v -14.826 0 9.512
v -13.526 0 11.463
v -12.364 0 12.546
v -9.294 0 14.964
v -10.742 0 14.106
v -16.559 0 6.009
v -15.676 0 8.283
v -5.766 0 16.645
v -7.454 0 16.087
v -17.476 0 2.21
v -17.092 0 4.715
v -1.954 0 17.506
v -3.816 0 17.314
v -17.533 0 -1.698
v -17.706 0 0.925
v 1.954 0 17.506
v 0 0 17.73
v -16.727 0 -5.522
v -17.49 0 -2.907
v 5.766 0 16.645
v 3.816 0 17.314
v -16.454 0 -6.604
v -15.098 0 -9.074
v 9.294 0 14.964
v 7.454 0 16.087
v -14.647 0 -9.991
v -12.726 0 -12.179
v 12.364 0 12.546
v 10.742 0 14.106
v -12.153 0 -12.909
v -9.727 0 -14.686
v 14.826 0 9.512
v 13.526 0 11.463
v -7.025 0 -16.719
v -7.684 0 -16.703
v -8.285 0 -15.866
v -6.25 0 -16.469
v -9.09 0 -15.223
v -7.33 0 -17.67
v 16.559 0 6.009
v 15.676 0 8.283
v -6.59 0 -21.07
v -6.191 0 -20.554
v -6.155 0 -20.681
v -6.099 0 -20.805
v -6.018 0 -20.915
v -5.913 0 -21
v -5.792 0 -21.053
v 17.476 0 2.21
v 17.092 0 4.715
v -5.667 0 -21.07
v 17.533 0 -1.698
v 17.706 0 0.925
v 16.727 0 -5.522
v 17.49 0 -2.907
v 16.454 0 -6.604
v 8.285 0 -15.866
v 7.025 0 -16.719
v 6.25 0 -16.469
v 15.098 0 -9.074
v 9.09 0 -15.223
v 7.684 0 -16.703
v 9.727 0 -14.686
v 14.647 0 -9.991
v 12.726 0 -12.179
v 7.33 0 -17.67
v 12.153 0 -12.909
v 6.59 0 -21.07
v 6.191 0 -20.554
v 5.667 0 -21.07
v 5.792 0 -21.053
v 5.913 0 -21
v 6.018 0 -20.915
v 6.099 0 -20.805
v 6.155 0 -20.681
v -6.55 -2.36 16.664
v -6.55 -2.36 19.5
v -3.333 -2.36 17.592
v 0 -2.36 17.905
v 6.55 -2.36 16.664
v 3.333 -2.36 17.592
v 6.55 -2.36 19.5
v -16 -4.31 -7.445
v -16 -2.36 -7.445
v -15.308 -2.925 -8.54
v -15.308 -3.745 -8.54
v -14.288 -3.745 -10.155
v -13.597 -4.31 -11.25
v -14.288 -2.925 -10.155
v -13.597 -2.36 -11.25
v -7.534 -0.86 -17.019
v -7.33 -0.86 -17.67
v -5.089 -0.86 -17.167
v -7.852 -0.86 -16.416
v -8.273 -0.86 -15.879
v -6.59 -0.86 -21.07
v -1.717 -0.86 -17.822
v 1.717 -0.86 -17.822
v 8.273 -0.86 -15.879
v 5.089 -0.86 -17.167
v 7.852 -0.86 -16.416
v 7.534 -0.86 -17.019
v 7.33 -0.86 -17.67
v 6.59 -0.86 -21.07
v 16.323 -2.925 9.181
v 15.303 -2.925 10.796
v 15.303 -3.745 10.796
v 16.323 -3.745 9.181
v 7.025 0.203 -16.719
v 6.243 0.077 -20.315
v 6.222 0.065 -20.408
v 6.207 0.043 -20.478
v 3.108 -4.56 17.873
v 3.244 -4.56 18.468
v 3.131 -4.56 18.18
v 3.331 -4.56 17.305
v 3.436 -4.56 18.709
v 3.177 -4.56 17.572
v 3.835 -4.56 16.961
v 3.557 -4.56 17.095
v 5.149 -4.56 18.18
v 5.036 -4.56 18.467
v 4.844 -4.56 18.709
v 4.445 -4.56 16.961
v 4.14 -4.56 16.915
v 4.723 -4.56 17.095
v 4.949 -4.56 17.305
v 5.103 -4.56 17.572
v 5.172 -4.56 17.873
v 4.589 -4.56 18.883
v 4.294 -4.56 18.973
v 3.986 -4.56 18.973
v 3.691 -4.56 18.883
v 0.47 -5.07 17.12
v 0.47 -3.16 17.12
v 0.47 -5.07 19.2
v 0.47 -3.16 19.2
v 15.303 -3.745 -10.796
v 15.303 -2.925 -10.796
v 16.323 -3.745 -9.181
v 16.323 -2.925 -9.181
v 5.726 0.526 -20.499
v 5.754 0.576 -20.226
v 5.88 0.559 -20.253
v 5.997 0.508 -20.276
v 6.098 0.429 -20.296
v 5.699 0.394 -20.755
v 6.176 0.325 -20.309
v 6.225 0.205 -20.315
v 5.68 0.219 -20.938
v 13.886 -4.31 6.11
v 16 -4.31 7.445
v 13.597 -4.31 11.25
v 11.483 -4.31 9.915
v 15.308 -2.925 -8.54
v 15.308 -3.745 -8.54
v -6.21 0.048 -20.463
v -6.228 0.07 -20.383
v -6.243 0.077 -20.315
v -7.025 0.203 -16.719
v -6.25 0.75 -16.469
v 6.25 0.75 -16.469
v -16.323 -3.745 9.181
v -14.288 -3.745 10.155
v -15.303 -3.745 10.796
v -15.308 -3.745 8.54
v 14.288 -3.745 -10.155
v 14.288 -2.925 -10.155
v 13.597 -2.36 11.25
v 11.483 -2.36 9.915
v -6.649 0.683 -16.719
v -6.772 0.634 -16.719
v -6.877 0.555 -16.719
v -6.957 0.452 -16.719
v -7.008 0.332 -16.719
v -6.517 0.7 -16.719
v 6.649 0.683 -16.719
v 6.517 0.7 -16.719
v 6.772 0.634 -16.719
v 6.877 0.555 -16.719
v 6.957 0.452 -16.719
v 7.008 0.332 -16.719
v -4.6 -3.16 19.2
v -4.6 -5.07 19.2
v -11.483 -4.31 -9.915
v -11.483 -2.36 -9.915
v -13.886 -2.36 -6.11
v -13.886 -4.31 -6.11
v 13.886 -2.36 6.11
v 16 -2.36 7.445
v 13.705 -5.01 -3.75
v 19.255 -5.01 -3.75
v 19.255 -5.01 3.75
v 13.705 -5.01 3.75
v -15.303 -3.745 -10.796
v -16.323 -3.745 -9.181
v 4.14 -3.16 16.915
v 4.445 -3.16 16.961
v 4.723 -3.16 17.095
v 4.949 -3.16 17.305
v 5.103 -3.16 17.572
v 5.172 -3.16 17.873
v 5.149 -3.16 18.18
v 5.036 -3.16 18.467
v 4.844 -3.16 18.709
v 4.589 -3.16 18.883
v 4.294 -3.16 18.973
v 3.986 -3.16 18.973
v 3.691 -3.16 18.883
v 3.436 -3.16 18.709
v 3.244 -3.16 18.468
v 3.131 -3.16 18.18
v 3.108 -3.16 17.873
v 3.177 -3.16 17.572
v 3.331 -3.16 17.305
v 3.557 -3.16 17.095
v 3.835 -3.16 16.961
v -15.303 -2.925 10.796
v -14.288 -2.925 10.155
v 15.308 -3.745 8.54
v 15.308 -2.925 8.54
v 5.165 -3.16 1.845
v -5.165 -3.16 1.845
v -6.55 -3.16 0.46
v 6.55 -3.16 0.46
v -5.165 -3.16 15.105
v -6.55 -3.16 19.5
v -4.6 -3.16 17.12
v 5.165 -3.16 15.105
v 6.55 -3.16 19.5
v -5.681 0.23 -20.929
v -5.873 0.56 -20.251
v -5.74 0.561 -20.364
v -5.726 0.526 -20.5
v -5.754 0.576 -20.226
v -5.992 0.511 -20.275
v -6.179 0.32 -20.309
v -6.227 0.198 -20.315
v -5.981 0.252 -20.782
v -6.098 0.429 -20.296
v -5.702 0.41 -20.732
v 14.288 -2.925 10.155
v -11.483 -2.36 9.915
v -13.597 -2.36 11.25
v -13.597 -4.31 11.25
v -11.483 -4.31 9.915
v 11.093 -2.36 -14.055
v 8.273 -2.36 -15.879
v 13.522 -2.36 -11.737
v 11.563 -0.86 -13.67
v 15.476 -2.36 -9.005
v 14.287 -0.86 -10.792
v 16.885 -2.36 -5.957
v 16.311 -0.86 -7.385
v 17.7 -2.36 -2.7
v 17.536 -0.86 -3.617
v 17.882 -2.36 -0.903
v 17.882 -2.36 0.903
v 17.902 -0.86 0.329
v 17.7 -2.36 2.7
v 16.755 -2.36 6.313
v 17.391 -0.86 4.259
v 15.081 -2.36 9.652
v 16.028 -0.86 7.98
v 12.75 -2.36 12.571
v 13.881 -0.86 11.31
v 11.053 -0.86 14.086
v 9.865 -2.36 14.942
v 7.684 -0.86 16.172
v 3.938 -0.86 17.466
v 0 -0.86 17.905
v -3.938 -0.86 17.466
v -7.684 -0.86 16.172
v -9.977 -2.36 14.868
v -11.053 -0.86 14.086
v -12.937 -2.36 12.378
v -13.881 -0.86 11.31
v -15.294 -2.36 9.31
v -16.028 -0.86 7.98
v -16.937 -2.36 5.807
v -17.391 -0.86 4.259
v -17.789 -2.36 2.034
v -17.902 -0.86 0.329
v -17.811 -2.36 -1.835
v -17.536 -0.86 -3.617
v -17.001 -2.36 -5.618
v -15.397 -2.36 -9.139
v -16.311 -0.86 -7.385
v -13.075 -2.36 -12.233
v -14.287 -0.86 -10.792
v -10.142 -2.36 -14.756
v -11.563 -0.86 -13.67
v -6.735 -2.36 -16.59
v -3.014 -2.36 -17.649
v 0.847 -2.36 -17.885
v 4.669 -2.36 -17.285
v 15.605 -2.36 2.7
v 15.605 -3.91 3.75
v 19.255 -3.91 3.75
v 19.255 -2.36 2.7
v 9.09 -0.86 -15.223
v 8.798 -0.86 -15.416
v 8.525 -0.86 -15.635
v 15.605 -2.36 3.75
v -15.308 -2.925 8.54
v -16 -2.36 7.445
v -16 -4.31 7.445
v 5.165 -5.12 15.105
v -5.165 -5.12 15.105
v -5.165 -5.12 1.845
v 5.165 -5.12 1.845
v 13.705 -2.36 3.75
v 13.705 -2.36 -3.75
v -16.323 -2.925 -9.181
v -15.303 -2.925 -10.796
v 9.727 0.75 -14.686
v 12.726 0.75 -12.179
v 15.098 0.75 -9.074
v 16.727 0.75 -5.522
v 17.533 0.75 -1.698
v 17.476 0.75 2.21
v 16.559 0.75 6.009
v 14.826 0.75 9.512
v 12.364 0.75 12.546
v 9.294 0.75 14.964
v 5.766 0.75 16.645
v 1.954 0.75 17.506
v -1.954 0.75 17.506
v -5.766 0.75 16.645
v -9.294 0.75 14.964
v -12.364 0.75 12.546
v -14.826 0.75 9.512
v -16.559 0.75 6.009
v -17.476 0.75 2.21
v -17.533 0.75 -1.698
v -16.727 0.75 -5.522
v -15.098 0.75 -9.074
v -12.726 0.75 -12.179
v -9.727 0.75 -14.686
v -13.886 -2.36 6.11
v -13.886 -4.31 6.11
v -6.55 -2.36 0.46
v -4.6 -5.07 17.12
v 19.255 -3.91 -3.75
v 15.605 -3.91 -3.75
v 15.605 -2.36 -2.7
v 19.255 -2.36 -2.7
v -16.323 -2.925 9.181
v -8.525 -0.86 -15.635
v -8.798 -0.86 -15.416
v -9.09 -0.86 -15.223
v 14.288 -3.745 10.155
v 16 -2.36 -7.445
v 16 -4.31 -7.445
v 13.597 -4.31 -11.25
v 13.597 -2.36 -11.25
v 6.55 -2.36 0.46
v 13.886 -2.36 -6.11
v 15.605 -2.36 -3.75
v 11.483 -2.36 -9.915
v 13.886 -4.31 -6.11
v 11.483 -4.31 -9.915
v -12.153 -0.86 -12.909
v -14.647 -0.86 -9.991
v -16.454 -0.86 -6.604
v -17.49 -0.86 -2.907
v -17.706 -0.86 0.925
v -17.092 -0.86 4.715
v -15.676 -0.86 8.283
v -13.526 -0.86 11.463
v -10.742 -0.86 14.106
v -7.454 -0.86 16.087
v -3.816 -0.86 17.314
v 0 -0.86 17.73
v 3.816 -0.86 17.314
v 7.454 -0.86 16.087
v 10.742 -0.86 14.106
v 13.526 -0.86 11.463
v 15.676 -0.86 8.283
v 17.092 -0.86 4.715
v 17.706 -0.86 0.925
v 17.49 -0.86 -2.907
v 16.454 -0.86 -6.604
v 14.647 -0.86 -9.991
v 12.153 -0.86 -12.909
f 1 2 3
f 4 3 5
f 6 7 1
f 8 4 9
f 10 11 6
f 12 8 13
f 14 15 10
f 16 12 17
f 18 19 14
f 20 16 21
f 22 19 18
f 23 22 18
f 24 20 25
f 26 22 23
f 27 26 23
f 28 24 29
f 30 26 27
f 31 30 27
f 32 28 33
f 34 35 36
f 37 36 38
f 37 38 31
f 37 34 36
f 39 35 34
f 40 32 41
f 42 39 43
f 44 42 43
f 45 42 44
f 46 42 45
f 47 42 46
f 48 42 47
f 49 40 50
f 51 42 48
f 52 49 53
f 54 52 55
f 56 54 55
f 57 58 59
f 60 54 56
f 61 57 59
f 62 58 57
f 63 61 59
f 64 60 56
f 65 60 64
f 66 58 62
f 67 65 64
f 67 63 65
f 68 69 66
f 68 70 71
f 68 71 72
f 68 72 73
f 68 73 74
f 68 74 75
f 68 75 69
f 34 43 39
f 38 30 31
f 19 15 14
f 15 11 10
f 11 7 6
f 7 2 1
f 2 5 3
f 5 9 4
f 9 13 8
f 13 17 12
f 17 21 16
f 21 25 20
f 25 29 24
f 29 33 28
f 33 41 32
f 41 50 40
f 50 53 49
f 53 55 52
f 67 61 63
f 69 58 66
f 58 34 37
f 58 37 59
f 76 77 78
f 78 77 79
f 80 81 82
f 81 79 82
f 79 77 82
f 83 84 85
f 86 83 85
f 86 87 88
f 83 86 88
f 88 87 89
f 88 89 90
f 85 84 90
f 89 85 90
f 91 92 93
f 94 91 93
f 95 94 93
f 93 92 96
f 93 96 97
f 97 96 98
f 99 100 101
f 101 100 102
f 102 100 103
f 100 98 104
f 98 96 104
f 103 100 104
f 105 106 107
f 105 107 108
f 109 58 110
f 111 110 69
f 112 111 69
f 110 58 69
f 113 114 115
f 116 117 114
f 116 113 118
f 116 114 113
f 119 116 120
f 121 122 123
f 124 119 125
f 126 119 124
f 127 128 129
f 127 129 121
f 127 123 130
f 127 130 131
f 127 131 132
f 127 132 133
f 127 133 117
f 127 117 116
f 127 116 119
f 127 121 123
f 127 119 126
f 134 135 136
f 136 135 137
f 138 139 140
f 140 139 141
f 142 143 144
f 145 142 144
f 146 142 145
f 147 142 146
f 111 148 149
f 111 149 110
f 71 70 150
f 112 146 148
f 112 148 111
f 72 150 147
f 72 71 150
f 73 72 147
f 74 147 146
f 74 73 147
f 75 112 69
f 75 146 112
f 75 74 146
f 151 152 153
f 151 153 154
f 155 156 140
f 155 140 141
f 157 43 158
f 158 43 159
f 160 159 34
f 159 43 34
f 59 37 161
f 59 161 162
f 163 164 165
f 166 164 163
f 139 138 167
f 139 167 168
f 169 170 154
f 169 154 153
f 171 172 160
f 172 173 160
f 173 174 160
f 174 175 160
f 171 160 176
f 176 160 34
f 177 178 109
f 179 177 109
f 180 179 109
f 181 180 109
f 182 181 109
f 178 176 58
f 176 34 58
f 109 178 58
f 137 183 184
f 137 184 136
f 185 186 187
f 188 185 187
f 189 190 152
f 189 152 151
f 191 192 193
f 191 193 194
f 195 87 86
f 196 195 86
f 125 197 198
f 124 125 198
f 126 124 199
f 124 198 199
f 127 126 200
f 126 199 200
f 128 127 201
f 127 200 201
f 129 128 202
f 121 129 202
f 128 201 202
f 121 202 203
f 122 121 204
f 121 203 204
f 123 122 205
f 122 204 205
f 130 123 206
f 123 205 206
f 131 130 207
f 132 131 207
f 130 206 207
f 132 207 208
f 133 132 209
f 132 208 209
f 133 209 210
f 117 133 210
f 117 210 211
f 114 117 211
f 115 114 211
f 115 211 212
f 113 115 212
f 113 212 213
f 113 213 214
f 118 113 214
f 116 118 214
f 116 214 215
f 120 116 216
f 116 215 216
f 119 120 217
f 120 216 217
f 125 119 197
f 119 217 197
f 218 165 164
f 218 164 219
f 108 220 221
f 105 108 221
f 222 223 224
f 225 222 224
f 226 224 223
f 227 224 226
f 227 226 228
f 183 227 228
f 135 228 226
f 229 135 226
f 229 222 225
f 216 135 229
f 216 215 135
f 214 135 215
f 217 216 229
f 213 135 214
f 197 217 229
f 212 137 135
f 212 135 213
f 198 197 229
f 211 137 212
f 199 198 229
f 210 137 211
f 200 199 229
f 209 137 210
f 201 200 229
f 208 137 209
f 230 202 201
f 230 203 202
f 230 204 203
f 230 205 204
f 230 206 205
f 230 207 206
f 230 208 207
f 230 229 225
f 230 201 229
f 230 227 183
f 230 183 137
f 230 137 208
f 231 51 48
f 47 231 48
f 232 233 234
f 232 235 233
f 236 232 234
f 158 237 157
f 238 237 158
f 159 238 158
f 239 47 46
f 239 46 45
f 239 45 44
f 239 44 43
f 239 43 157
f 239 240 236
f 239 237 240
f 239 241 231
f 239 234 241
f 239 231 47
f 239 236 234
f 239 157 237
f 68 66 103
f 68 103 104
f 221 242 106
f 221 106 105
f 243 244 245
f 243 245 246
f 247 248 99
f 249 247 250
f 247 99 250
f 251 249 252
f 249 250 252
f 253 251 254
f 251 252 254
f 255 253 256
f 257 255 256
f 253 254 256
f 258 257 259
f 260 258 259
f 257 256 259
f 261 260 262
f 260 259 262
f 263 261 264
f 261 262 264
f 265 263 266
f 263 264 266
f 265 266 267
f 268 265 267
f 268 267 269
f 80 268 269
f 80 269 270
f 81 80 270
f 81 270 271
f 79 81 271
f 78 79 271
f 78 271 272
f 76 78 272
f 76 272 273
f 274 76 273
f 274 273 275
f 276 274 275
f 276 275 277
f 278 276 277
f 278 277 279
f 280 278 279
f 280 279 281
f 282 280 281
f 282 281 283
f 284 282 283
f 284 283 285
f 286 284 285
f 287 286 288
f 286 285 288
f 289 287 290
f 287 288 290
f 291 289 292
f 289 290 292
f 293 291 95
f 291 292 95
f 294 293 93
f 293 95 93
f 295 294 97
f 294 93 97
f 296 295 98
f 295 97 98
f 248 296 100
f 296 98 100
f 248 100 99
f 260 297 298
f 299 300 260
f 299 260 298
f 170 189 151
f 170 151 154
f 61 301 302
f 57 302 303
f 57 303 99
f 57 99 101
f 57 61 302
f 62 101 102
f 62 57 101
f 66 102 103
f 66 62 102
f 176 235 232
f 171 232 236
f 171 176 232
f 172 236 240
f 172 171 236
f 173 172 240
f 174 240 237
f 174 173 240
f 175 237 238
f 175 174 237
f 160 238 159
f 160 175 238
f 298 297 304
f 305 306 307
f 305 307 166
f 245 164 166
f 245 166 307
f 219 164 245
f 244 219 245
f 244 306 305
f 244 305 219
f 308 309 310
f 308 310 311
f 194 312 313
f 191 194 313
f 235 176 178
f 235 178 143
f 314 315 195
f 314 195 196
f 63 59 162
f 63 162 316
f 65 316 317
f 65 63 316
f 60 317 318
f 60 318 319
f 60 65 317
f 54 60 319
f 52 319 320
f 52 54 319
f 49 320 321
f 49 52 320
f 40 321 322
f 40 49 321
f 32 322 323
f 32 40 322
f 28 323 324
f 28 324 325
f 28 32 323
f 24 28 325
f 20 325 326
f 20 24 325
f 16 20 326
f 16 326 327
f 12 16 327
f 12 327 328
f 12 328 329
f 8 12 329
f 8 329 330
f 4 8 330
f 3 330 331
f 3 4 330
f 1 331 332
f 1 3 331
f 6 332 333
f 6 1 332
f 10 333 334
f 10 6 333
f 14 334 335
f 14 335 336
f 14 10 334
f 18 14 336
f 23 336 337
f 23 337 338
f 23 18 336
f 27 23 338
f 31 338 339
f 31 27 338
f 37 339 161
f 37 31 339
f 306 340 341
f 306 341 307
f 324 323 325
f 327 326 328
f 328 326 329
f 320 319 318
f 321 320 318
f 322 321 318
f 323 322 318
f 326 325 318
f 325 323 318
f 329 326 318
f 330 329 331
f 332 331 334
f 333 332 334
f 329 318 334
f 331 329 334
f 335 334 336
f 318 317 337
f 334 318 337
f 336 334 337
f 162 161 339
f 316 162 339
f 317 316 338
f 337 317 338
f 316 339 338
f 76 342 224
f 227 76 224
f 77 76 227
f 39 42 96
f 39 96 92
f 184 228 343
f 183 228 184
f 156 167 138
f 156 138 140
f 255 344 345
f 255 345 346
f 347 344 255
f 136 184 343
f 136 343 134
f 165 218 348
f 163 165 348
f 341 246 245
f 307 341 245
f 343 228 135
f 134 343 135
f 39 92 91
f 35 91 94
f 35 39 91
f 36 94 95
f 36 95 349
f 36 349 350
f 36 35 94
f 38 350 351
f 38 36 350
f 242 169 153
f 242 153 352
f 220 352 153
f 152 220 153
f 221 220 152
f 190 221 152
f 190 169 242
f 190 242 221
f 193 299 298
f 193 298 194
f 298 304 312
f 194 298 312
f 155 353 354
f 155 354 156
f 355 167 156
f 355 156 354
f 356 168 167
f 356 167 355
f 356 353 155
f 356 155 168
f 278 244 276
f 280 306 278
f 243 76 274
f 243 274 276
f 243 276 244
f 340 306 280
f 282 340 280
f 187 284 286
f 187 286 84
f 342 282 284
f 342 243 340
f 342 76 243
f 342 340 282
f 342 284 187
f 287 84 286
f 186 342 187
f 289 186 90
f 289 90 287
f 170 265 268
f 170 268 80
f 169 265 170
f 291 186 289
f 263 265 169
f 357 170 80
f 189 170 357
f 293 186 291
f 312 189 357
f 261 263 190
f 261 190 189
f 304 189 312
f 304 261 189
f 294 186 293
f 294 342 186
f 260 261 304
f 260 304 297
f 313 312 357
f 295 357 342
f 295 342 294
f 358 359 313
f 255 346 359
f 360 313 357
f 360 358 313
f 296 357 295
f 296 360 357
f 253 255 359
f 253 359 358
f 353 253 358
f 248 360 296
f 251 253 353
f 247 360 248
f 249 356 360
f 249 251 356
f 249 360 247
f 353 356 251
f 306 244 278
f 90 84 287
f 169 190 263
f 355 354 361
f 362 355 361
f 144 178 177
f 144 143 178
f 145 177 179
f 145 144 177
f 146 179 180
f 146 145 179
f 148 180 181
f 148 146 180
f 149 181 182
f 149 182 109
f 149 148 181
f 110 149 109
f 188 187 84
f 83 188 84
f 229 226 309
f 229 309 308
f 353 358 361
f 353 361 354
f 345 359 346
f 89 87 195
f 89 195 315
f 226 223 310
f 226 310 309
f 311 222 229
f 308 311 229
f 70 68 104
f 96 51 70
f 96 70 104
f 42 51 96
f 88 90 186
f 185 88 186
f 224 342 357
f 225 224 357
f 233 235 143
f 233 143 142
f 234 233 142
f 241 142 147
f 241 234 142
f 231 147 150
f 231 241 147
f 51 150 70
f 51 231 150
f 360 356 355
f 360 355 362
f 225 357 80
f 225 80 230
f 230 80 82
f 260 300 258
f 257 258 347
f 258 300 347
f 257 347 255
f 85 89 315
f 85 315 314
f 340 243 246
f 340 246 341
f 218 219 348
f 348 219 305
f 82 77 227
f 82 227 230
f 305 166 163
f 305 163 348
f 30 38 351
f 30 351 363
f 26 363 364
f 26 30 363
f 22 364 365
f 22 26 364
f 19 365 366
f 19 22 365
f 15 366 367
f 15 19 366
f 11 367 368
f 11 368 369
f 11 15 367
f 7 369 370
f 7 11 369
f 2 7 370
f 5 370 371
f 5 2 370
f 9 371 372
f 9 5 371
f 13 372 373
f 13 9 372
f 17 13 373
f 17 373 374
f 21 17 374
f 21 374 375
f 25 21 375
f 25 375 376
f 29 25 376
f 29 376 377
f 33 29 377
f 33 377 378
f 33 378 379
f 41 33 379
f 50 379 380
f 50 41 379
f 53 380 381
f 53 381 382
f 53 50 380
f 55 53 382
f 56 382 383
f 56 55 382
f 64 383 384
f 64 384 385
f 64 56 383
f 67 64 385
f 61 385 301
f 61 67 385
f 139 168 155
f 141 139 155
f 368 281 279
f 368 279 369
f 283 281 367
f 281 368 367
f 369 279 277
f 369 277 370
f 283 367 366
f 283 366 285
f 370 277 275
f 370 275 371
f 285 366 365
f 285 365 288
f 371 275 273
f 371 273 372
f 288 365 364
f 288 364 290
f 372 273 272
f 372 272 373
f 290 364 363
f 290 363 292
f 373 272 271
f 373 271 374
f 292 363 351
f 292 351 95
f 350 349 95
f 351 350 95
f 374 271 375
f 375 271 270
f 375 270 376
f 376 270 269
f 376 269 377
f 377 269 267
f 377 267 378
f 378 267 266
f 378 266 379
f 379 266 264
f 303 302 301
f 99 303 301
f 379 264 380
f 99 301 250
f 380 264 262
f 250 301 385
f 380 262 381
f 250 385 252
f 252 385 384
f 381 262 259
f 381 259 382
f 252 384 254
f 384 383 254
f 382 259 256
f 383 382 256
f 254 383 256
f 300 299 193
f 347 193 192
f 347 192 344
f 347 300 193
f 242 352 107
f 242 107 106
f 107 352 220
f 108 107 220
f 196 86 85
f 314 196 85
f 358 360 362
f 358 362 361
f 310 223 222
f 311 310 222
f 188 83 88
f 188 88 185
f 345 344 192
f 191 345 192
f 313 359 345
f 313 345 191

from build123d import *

# Parameters (mm, degrees)
BOSS_EXTRUDE1_DEPTH     = 0.75
BOSS_EXTRUDE2_DEPTH     = 0.86
SKETCH3_R               = 17.905
BOSS_EXTRUDE3_DEPTH     = 1.5
SKETCH4_W               = 13.1
SKETCH4_H               = 19.04
BOSS_EXTRUDE4_DEPTH     = 0.8
SKETCH5_W               = 10.33
SKETCH5_H               = 13.26
BOSS_EXTRUDE5_DEPTH     = 1.96
SKETCH6_W               = 5.07
SKETCH6_H               = 2.08
BOSS_EXTRUDE6_DEPTH     = 1.91
SKETCH7_R               = 1.035
BOSS_EXTRUDE7_DEPTH     = 1.4
BOSS_EXTRUDE8_DEPTH     = 1.95
SKETCH9_W               = 1.91
SKETCH9_H               = 0.82
BOSS_EXTRUDE9_DEPTH     = 1.2
MIRROR2_COPY_1_SKETCH_W = 1.91
MIRROR2_COPY_1_SKETCH_H = 0.82
MIRROR2_COPY_1_DEPTH    = 1.2
SKETCH10_W              = 5.55
SKETCH10_H              = 7.5
BOSS_EXTRUDE10_DEPTH    = 2.65
CUT_EXTRUDE1_DEPTH      = 3.65
BOSS_EXTRUDE11_DEPTH    = 0.7
CUT_EXTRUDE2_DEPTH      = 10
CUT_EXTRUDE2_DEPTH_BACK = 10
FILLET1_R               = 0.5


with BuildPart() as part:
    # Sketch1 → Boss-Extrude1 (new body)
    with BuildSketch(Plane(origin=(0, 0, 0), x_dir=(1, 0, 0), z_dir=(0, 1, 0))):
        with BuildLine():
            Line((-6.25, 16.468932115), (6.25, 16.468932115))
            ThreePointArc((6.25, 16.468932115), (0, -17.615), (-6.25, 16.468932115))
        make_face()
    extrude(amount=BOSS_EXTRUDE1_DEPTH)

    # Sketch2 → Boss-Extrude2 (add)
    with BuildSketch(Plane(origin=(0, 0, 0), x_dir=(1, 0, 0), z_dir=(0, 1, 0))):
        with BuildLine():
            Line((6.59, 21.07), (-6.59, 21.07))
            Line((-6.59, 21.07), (-7.33, 17.670177364))
            ThreePointArc((-7.33, 17.670177364), (-7.956125045, 16.26379425), (-9.09, 15.222509649))
            ThreePointArc((-9.09, 15.222509649), (0, -17.73), (9.09, 15.222509649))
            ThreePointArc((9.09, 15.222509649), (7.956125045, 16.26379425), (7.33, 17.670177364))
            Line((7.33, 17.670177364), (6.59, 21.07))
        make_face()
    extrude(amount=-BOSS_EXTRUDE2_DEPTH)

    # Sketch3 → Boss-Extrude3 (add)
    with BuildSketch(Plane.XZ.offset(0.86)):
        with Locations(Location((0, 0, 0), (0, 0, 297.520154759))):
            Circle(SKETCH3_R)
    extrude(amount=BOSS_EXTRUDE3_DEPTH)

    # Sketch4 → Boss-Extrude4 (add)
    with BuildSketch(Plane.XZ.offset(2.36)):
        with Locations((0, 9.98)):
            Rectangle(SKETCH4_W, SKETCH4_H)
    extrude(amount=BOSS_EXTRUDE4_DEPTH)

    # Sketch5 → Boss-Extrude5 (add)
    with BuildSketch(Plane.XZ.offset(3.16)):
        with Locations((0, 8.475)):
            Rectangle(SKETCH5_W, SKETCH5_H)
    extrude(amount=BOSS_EXTRUDE5_DEPTH)

    # Sketch6 → Boss-Extrude6 (add)
    with BuildSketch(Plane.XZ.offset(3.16)):
        with Locations((-2.065, 18.16)):
            Rectangle(SKETCH6_W, SKETCH6_H)
    extrude(amount=BOSS_EXTRUDE6_DEPTH)

    # Sketch7 → Boss-Extrude7 (add)
    with BuildSketch(Plane.XZ.offset(3.16)):
        with Locations(Location((4.14, 17.95, 0), (0, 0, 270))):
            Circle(SKETCH7_R)
    extrude(amount=BOSS_EXTRUDE7_DEPTH)

    # Sketch8 → Boss-Extrude8 (add)
    with BuildSketch(Plane.XZ.offset(2.36)):
        Polygon((16, -7.445460012), (13.596778104, -11.25), (11.483144777, -9.914876724), (13.886366674, -6.110336737), align=None)
        Polygon((-16, -7.445460012), (-13.596778104, -11.25), (-11.483144777, -9.914876724), (-13.886366674, -6.110336737), align=None)
        Polygon((-16, 7.445460012), (-13.596778104, 11.25), (-11.483144777, 9.914876724), (-13.886366674, 6.110336737), align=None)
        Polygon((13.886366674, 6.110336737), (11.483144777, 9.914876724), (13.596778104, 11.25), (16, 7.445460012), align=None)
    extrude(amount=BOSS_EXTRUDE8_DEPTH)

    # Sketch9 → Boss-Extrude9 (add)
    with BuildSketch(Plane(origin=(-14.798389052, 0, -9.347730006), x_dir=(-0.5340493103180728, 0, 0.84545333055633), z_dir=(-0.8454533305563299, 0, -0.5340493103180727))):
        with Locations((0, -3.335)):
            Rectangle(SKETCH9_W, SKETCH9_H)
    boss_extrude9 = extrude(amount=BOSS_EXTRUDE9_DEPTH)

    # Mirror1: Boss-Extrude9 across plane
    add(boss_extrude9.mirror(Plane.XY))

    # Mirror2: Boss-Extrude9 across plane
    add(boss_extrude9.mirror(Plane(origin=(0, 0, 0), x_dir=(0, 0, 1), z_dir=(1, 0, 0))))

    # Mirror2 copy 1 sketch → Mirror2 copy 1 (add)
    with BuildSketch(Plane(origin=(14.798389052, 0, 9.347730006), x_dir=(0.5340493103180728, 0, -0.84545333055633), z_dir=(0.8454533305563299, 0, 0.5340493103180727))):
        with Locations((0, -3.335)):
            Rectangle(MIRROR2_COPY_1_SKETCH_W, MIRROR2_COPY_1_SKETCH_H)
    extrude(amount=MIRROR2_COPY_1_DEPTH)

    # Sketch10 → Boss-Extrude10 (add)
    with BuildSketch(Plane(origin=(0, -2.36, 0), x_dir=(-1, 0, 0), z_dir=(0, -1, 0))):
        with Locations((-16.48, 0)):
            Rectangle(SKETCH10_W, SKETCH10_H)
    extrude(amount=BOSS_EXTRUDE10_DEPTH)

    # Sketch11 → Cut-Extrude1 (cut)
    with BuildSketch(Plane(origin=(19.255, 0, 0), x_dir=(0, 0, -1), z_dir=(1, 0, 0))):
        Polygon((3.75, -5.01), (3.75, -3.91), (2.7, -2.36), (4.361270296, -2.36), (4.361270296, -9.207681493), (-4.361270296, -9.207681493), (-4.361270296, -2.36), (-2.7, -2.36), (-3.75, -3.91), (-3.75, -5.01), align=None)
    extrude(amount=-CUT_EXTRUDE1_DEPTH, mode=Mode.SUBTRACT)

    # Sketch12 → Boss-Extrude11 (add)
    with BuildSketch(Plane(origin=(0, 0, 0), x_dir=(1, 0, 0), z_dir=(0, 1, 0))):
        Polygon((-7.025339783, 16.718932115), (7.025339783, 16.718932115), (6.078293252, 21.07), (-6.078293252, 21.07), align=None)
    extrude(amount=BOSS_EXTRUDE11_DEPTH)

    # Sketch13 → Cut-Extrude2 (cut, two sides: drawn at the far end of the back side and taken through both)
    with BuildSketch(Plane(origin=(0, 0, 0), x_dir=(0, 0, -1), z_dir=(1, 0, 0)).offset(-CUT_EXTRUDE2_DEPTH_BACK)):
        with BuildLine():
            Line((16.718932115, 0.7), (20.225865386, 0.576368288))
            ThreePointArc((20.225865386, 0.576368288), (20.731401374, 0.410430291), (21.07, 0))
            Line((21.07, 0), (21.650216757, 1.081319804))
            Line((21.650216757, 1.081319804), (16.718932115, 1.620600457))
            Line((16.718932115, 1.620600457), (16.718932115, 0.7))
        make_face()
    extrude(amount=CUT_EXTRUDE2_DEPTH + CUT_EXTRUDE2_DEPTH_BACK, mode=Mode.SUBTRACT)

    # Fillet1
    fillet1_edges = [part.edges().sort_by_distance(p)[0] for p in [
        (6.152517901, 0.412074342, -20.728985619),
        (-6.152517901, 0.412074342, -20.728985619),
        (-6.643683018, 0.638184144, -18.47239875),
        (6.643683018, 0.638184144, -18.47239875),
    ]]
    fillet(fillet1_edges, radius=FILLET1_R)


solid = part.part
